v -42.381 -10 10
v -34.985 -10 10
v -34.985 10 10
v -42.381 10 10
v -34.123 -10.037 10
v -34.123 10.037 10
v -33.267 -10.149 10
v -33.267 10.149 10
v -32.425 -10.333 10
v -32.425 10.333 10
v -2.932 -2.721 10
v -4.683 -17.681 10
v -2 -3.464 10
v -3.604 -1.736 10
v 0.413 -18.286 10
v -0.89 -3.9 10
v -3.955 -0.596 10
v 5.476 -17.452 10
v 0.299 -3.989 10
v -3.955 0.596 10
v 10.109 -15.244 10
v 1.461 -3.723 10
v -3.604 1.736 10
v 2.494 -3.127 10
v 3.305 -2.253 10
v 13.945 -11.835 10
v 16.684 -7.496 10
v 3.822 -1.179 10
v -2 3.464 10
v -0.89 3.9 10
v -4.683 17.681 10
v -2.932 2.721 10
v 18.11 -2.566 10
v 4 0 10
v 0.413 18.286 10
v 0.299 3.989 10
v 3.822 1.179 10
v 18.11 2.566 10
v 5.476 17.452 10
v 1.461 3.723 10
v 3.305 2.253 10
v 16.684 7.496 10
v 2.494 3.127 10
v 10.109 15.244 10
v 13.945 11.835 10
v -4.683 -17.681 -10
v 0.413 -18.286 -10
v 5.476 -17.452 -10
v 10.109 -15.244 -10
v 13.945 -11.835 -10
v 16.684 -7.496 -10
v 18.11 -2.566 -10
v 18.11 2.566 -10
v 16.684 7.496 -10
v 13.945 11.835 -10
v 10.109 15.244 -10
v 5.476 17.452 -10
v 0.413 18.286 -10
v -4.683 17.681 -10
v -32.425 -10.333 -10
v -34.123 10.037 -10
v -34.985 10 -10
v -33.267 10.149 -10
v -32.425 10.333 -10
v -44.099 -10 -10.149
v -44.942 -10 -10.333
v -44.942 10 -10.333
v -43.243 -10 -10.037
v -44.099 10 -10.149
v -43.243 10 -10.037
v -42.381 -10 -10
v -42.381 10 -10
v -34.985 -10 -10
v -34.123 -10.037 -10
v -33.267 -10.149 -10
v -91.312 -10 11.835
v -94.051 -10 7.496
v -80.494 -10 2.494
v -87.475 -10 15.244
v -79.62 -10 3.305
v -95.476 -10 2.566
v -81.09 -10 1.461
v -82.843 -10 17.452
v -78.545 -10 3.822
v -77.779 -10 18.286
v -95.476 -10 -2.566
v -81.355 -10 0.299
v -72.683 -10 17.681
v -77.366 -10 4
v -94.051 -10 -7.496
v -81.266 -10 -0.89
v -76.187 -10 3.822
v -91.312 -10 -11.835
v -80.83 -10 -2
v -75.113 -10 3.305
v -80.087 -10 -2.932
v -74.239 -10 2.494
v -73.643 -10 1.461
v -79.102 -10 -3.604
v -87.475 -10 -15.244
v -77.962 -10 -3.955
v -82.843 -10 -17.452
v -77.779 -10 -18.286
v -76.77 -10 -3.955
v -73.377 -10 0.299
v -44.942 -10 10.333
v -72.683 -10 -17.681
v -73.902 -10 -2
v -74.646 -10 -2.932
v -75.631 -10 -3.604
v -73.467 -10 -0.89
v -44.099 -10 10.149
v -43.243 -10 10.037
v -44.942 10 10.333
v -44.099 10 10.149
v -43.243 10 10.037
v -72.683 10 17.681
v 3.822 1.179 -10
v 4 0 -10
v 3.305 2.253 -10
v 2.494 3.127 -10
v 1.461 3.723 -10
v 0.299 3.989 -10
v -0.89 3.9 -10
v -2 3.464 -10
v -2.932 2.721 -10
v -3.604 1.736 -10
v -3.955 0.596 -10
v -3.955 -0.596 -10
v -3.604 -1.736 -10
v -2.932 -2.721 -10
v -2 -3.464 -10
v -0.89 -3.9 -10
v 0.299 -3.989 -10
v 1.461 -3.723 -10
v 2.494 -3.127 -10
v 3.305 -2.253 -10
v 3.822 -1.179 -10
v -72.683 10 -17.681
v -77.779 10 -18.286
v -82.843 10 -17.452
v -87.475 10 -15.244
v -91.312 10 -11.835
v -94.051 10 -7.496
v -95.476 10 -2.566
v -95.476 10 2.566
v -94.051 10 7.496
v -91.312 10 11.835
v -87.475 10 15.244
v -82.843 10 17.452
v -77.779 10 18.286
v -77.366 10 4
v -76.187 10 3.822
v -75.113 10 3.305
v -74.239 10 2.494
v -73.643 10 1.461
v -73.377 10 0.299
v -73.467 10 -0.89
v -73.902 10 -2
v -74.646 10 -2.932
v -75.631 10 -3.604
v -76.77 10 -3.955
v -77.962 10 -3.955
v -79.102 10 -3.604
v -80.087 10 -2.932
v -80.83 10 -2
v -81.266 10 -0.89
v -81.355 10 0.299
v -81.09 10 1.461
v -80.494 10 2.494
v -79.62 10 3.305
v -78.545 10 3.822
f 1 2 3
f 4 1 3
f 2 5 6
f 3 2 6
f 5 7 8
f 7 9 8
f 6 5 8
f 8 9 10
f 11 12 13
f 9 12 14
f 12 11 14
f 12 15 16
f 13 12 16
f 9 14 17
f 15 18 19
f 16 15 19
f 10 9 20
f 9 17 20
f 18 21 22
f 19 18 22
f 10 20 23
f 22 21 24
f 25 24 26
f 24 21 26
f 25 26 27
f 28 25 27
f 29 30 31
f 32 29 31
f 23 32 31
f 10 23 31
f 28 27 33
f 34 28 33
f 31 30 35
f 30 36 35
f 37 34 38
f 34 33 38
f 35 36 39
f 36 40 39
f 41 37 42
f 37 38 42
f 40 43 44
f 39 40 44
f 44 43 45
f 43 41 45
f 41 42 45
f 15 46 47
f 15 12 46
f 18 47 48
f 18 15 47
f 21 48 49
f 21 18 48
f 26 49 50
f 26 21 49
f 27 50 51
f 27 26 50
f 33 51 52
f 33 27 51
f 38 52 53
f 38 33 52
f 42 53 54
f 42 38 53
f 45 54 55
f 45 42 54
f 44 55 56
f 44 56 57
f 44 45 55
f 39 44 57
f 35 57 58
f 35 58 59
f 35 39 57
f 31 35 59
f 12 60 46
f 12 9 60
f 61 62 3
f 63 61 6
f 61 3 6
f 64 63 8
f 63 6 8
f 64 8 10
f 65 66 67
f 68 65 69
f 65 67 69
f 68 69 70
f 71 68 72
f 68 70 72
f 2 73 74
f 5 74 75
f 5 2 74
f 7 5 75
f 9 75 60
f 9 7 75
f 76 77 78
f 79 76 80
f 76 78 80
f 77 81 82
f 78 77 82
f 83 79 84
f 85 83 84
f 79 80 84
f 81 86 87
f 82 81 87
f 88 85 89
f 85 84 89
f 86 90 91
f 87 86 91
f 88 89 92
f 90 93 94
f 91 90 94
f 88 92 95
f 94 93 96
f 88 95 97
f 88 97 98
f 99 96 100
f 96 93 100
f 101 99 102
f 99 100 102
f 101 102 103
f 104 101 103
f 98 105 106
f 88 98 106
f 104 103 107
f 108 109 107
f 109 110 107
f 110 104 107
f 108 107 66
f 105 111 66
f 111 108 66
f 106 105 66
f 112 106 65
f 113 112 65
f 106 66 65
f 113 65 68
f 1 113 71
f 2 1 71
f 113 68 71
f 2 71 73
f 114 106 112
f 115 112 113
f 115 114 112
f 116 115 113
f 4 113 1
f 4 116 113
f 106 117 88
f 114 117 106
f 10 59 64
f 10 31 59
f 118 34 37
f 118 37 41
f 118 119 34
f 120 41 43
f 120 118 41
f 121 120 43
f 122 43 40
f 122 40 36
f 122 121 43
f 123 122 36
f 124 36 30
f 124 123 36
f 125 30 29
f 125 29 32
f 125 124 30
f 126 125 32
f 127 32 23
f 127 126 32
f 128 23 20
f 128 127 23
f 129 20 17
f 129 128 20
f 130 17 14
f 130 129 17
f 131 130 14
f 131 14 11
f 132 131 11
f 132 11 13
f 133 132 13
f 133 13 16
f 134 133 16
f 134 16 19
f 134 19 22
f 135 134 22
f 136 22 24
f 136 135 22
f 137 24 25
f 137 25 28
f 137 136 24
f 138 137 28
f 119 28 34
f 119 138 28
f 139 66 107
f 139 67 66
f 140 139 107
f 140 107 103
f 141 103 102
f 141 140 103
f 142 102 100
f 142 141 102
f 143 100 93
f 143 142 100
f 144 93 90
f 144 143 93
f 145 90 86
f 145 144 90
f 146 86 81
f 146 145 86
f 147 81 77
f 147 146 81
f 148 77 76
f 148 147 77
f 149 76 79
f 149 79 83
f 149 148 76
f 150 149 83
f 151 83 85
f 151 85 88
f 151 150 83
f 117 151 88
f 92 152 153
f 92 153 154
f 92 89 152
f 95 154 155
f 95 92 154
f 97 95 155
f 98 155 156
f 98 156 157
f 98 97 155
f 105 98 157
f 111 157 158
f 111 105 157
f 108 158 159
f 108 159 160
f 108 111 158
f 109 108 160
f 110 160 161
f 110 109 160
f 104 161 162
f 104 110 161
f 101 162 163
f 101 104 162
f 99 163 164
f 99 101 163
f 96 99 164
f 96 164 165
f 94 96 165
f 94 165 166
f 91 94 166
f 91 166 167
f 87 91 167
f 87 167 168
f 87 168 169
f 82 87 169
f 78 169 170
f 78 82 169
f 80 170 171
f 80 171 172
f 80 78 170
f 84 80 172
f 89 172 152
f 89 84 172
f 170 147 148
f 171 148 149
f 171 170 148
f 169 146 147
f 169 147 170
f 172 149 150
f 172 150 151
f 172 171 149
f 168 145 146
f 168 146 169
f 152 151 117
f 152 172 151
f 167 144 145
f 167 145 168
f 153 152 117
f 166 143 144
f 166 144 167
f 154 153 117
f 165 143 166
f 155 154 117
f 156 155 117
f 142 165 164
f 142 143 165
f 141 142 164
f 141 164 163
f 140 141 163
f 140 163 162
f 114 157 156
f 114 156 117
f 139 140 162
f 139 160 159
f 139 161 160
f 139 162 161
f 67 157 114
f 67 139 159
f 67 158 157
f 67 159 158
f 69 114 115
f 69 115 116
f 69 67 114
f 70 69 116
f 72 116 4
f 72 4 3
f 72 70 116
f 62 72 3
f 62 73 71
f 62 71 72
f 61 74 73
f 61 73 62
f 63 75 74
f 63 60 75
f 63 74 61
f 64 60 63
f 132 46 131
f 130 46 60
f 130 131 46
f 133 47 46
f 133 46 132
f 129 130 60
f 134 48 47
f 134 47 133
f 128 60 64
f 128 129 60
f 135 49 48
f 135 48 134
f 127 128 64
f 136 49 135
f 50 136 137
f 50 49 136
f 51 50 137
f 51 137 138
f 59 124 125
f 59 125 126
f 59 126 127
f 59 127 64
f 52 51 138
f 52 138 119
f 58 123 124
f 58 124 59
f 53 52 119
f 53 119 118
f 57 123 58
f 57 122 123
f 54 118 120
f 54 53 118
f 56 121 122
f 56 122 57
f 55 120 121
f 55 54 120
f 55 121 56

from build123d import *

# Parameters (mm, degrees)
SKETCH1_R           = 4
BOSS_EXTRUDE1_DEPTH = 10
SKETCH2_W           = 20
SKETCH2_H           = 20
BOSS_EXTRUDE2_DEPTH = 10
SKETCH3_R           = 4
BOSS_EXTRUDE4_DEPTH = 10
FILLET1_R           = 10


with BuildPart() as part:
    # Sketch1 → Boss-Extrude1 (new, symmetric)
    with BuildSketch(Plane.XY):
        with BuildLine():
            Line((-4.683153706, 17.681145748), (-33.683153706, 10))
            Line((-33.683153706, 10), (-33.683153706, -10))
            Line((-33.683153706, -10), (-4.683153706, -17.681145748))
            ThreePointArc((-4.683153706, -17.681145748), (18.290840429, 0), (-4.683153706, 17.681145748))
        make_face()
        Circle(SKETCH1_R, mode=Mode.SUBTRACT)
    extrude(amount=BOSS_EXTRUDE1_DEPTH, both=True)

    # Sketch2 → Boss-Extrude2 (add)
    with BuildSketch(Plane.ZY.offset(33.683153706)):
        Rectangle(SKETCH2_W, SKETCH2_H)
    extrude(amount=BOSS_EXTRUDE2_DEPTH)

    # Sketch3 → Boss-Extrude4 (add, symmetric)
    with BuildSketch(Plane(origin=(0, 0, 0), x_dir=(1, 0, 0), z_dir=(0, 1, 0))):
        with BuildLine():
            Line((-43.683153706, 10), (-72.683153706, 17.681145748))
            ThreePointArc((-72.683153706, 17.681145748), (-95.657147841, 0), (-72.683153706, -17.681145748))
            Line((-72.683153706, -17.681145748), (-43.683153706, -10))
            Line((-43.683153706, -10), (-43.683153706, 10))
        make_face()
        with Locations(Location((-77.366307412, 0, 0), (0, 0, 270))):
            Circle(SKETCH3_R, mode=Mode.SUBTRACT)
    extrude(amount=BOSS_EXTRUDE4_DEPTH, both=True)

    # Fillet1
    fillet1_edges = [part.edges().sort_by_distance(p)[0] for p in [
        (-43.683153706, 0, 10),
        (-43.683153706, 0, -10),
        (-33.683153706, -10, 0),
        (-33.683153706, 10, 0),
    ]]
    fillet(fillet1_edges, radius=FILLET1_R)


solid = part.part
